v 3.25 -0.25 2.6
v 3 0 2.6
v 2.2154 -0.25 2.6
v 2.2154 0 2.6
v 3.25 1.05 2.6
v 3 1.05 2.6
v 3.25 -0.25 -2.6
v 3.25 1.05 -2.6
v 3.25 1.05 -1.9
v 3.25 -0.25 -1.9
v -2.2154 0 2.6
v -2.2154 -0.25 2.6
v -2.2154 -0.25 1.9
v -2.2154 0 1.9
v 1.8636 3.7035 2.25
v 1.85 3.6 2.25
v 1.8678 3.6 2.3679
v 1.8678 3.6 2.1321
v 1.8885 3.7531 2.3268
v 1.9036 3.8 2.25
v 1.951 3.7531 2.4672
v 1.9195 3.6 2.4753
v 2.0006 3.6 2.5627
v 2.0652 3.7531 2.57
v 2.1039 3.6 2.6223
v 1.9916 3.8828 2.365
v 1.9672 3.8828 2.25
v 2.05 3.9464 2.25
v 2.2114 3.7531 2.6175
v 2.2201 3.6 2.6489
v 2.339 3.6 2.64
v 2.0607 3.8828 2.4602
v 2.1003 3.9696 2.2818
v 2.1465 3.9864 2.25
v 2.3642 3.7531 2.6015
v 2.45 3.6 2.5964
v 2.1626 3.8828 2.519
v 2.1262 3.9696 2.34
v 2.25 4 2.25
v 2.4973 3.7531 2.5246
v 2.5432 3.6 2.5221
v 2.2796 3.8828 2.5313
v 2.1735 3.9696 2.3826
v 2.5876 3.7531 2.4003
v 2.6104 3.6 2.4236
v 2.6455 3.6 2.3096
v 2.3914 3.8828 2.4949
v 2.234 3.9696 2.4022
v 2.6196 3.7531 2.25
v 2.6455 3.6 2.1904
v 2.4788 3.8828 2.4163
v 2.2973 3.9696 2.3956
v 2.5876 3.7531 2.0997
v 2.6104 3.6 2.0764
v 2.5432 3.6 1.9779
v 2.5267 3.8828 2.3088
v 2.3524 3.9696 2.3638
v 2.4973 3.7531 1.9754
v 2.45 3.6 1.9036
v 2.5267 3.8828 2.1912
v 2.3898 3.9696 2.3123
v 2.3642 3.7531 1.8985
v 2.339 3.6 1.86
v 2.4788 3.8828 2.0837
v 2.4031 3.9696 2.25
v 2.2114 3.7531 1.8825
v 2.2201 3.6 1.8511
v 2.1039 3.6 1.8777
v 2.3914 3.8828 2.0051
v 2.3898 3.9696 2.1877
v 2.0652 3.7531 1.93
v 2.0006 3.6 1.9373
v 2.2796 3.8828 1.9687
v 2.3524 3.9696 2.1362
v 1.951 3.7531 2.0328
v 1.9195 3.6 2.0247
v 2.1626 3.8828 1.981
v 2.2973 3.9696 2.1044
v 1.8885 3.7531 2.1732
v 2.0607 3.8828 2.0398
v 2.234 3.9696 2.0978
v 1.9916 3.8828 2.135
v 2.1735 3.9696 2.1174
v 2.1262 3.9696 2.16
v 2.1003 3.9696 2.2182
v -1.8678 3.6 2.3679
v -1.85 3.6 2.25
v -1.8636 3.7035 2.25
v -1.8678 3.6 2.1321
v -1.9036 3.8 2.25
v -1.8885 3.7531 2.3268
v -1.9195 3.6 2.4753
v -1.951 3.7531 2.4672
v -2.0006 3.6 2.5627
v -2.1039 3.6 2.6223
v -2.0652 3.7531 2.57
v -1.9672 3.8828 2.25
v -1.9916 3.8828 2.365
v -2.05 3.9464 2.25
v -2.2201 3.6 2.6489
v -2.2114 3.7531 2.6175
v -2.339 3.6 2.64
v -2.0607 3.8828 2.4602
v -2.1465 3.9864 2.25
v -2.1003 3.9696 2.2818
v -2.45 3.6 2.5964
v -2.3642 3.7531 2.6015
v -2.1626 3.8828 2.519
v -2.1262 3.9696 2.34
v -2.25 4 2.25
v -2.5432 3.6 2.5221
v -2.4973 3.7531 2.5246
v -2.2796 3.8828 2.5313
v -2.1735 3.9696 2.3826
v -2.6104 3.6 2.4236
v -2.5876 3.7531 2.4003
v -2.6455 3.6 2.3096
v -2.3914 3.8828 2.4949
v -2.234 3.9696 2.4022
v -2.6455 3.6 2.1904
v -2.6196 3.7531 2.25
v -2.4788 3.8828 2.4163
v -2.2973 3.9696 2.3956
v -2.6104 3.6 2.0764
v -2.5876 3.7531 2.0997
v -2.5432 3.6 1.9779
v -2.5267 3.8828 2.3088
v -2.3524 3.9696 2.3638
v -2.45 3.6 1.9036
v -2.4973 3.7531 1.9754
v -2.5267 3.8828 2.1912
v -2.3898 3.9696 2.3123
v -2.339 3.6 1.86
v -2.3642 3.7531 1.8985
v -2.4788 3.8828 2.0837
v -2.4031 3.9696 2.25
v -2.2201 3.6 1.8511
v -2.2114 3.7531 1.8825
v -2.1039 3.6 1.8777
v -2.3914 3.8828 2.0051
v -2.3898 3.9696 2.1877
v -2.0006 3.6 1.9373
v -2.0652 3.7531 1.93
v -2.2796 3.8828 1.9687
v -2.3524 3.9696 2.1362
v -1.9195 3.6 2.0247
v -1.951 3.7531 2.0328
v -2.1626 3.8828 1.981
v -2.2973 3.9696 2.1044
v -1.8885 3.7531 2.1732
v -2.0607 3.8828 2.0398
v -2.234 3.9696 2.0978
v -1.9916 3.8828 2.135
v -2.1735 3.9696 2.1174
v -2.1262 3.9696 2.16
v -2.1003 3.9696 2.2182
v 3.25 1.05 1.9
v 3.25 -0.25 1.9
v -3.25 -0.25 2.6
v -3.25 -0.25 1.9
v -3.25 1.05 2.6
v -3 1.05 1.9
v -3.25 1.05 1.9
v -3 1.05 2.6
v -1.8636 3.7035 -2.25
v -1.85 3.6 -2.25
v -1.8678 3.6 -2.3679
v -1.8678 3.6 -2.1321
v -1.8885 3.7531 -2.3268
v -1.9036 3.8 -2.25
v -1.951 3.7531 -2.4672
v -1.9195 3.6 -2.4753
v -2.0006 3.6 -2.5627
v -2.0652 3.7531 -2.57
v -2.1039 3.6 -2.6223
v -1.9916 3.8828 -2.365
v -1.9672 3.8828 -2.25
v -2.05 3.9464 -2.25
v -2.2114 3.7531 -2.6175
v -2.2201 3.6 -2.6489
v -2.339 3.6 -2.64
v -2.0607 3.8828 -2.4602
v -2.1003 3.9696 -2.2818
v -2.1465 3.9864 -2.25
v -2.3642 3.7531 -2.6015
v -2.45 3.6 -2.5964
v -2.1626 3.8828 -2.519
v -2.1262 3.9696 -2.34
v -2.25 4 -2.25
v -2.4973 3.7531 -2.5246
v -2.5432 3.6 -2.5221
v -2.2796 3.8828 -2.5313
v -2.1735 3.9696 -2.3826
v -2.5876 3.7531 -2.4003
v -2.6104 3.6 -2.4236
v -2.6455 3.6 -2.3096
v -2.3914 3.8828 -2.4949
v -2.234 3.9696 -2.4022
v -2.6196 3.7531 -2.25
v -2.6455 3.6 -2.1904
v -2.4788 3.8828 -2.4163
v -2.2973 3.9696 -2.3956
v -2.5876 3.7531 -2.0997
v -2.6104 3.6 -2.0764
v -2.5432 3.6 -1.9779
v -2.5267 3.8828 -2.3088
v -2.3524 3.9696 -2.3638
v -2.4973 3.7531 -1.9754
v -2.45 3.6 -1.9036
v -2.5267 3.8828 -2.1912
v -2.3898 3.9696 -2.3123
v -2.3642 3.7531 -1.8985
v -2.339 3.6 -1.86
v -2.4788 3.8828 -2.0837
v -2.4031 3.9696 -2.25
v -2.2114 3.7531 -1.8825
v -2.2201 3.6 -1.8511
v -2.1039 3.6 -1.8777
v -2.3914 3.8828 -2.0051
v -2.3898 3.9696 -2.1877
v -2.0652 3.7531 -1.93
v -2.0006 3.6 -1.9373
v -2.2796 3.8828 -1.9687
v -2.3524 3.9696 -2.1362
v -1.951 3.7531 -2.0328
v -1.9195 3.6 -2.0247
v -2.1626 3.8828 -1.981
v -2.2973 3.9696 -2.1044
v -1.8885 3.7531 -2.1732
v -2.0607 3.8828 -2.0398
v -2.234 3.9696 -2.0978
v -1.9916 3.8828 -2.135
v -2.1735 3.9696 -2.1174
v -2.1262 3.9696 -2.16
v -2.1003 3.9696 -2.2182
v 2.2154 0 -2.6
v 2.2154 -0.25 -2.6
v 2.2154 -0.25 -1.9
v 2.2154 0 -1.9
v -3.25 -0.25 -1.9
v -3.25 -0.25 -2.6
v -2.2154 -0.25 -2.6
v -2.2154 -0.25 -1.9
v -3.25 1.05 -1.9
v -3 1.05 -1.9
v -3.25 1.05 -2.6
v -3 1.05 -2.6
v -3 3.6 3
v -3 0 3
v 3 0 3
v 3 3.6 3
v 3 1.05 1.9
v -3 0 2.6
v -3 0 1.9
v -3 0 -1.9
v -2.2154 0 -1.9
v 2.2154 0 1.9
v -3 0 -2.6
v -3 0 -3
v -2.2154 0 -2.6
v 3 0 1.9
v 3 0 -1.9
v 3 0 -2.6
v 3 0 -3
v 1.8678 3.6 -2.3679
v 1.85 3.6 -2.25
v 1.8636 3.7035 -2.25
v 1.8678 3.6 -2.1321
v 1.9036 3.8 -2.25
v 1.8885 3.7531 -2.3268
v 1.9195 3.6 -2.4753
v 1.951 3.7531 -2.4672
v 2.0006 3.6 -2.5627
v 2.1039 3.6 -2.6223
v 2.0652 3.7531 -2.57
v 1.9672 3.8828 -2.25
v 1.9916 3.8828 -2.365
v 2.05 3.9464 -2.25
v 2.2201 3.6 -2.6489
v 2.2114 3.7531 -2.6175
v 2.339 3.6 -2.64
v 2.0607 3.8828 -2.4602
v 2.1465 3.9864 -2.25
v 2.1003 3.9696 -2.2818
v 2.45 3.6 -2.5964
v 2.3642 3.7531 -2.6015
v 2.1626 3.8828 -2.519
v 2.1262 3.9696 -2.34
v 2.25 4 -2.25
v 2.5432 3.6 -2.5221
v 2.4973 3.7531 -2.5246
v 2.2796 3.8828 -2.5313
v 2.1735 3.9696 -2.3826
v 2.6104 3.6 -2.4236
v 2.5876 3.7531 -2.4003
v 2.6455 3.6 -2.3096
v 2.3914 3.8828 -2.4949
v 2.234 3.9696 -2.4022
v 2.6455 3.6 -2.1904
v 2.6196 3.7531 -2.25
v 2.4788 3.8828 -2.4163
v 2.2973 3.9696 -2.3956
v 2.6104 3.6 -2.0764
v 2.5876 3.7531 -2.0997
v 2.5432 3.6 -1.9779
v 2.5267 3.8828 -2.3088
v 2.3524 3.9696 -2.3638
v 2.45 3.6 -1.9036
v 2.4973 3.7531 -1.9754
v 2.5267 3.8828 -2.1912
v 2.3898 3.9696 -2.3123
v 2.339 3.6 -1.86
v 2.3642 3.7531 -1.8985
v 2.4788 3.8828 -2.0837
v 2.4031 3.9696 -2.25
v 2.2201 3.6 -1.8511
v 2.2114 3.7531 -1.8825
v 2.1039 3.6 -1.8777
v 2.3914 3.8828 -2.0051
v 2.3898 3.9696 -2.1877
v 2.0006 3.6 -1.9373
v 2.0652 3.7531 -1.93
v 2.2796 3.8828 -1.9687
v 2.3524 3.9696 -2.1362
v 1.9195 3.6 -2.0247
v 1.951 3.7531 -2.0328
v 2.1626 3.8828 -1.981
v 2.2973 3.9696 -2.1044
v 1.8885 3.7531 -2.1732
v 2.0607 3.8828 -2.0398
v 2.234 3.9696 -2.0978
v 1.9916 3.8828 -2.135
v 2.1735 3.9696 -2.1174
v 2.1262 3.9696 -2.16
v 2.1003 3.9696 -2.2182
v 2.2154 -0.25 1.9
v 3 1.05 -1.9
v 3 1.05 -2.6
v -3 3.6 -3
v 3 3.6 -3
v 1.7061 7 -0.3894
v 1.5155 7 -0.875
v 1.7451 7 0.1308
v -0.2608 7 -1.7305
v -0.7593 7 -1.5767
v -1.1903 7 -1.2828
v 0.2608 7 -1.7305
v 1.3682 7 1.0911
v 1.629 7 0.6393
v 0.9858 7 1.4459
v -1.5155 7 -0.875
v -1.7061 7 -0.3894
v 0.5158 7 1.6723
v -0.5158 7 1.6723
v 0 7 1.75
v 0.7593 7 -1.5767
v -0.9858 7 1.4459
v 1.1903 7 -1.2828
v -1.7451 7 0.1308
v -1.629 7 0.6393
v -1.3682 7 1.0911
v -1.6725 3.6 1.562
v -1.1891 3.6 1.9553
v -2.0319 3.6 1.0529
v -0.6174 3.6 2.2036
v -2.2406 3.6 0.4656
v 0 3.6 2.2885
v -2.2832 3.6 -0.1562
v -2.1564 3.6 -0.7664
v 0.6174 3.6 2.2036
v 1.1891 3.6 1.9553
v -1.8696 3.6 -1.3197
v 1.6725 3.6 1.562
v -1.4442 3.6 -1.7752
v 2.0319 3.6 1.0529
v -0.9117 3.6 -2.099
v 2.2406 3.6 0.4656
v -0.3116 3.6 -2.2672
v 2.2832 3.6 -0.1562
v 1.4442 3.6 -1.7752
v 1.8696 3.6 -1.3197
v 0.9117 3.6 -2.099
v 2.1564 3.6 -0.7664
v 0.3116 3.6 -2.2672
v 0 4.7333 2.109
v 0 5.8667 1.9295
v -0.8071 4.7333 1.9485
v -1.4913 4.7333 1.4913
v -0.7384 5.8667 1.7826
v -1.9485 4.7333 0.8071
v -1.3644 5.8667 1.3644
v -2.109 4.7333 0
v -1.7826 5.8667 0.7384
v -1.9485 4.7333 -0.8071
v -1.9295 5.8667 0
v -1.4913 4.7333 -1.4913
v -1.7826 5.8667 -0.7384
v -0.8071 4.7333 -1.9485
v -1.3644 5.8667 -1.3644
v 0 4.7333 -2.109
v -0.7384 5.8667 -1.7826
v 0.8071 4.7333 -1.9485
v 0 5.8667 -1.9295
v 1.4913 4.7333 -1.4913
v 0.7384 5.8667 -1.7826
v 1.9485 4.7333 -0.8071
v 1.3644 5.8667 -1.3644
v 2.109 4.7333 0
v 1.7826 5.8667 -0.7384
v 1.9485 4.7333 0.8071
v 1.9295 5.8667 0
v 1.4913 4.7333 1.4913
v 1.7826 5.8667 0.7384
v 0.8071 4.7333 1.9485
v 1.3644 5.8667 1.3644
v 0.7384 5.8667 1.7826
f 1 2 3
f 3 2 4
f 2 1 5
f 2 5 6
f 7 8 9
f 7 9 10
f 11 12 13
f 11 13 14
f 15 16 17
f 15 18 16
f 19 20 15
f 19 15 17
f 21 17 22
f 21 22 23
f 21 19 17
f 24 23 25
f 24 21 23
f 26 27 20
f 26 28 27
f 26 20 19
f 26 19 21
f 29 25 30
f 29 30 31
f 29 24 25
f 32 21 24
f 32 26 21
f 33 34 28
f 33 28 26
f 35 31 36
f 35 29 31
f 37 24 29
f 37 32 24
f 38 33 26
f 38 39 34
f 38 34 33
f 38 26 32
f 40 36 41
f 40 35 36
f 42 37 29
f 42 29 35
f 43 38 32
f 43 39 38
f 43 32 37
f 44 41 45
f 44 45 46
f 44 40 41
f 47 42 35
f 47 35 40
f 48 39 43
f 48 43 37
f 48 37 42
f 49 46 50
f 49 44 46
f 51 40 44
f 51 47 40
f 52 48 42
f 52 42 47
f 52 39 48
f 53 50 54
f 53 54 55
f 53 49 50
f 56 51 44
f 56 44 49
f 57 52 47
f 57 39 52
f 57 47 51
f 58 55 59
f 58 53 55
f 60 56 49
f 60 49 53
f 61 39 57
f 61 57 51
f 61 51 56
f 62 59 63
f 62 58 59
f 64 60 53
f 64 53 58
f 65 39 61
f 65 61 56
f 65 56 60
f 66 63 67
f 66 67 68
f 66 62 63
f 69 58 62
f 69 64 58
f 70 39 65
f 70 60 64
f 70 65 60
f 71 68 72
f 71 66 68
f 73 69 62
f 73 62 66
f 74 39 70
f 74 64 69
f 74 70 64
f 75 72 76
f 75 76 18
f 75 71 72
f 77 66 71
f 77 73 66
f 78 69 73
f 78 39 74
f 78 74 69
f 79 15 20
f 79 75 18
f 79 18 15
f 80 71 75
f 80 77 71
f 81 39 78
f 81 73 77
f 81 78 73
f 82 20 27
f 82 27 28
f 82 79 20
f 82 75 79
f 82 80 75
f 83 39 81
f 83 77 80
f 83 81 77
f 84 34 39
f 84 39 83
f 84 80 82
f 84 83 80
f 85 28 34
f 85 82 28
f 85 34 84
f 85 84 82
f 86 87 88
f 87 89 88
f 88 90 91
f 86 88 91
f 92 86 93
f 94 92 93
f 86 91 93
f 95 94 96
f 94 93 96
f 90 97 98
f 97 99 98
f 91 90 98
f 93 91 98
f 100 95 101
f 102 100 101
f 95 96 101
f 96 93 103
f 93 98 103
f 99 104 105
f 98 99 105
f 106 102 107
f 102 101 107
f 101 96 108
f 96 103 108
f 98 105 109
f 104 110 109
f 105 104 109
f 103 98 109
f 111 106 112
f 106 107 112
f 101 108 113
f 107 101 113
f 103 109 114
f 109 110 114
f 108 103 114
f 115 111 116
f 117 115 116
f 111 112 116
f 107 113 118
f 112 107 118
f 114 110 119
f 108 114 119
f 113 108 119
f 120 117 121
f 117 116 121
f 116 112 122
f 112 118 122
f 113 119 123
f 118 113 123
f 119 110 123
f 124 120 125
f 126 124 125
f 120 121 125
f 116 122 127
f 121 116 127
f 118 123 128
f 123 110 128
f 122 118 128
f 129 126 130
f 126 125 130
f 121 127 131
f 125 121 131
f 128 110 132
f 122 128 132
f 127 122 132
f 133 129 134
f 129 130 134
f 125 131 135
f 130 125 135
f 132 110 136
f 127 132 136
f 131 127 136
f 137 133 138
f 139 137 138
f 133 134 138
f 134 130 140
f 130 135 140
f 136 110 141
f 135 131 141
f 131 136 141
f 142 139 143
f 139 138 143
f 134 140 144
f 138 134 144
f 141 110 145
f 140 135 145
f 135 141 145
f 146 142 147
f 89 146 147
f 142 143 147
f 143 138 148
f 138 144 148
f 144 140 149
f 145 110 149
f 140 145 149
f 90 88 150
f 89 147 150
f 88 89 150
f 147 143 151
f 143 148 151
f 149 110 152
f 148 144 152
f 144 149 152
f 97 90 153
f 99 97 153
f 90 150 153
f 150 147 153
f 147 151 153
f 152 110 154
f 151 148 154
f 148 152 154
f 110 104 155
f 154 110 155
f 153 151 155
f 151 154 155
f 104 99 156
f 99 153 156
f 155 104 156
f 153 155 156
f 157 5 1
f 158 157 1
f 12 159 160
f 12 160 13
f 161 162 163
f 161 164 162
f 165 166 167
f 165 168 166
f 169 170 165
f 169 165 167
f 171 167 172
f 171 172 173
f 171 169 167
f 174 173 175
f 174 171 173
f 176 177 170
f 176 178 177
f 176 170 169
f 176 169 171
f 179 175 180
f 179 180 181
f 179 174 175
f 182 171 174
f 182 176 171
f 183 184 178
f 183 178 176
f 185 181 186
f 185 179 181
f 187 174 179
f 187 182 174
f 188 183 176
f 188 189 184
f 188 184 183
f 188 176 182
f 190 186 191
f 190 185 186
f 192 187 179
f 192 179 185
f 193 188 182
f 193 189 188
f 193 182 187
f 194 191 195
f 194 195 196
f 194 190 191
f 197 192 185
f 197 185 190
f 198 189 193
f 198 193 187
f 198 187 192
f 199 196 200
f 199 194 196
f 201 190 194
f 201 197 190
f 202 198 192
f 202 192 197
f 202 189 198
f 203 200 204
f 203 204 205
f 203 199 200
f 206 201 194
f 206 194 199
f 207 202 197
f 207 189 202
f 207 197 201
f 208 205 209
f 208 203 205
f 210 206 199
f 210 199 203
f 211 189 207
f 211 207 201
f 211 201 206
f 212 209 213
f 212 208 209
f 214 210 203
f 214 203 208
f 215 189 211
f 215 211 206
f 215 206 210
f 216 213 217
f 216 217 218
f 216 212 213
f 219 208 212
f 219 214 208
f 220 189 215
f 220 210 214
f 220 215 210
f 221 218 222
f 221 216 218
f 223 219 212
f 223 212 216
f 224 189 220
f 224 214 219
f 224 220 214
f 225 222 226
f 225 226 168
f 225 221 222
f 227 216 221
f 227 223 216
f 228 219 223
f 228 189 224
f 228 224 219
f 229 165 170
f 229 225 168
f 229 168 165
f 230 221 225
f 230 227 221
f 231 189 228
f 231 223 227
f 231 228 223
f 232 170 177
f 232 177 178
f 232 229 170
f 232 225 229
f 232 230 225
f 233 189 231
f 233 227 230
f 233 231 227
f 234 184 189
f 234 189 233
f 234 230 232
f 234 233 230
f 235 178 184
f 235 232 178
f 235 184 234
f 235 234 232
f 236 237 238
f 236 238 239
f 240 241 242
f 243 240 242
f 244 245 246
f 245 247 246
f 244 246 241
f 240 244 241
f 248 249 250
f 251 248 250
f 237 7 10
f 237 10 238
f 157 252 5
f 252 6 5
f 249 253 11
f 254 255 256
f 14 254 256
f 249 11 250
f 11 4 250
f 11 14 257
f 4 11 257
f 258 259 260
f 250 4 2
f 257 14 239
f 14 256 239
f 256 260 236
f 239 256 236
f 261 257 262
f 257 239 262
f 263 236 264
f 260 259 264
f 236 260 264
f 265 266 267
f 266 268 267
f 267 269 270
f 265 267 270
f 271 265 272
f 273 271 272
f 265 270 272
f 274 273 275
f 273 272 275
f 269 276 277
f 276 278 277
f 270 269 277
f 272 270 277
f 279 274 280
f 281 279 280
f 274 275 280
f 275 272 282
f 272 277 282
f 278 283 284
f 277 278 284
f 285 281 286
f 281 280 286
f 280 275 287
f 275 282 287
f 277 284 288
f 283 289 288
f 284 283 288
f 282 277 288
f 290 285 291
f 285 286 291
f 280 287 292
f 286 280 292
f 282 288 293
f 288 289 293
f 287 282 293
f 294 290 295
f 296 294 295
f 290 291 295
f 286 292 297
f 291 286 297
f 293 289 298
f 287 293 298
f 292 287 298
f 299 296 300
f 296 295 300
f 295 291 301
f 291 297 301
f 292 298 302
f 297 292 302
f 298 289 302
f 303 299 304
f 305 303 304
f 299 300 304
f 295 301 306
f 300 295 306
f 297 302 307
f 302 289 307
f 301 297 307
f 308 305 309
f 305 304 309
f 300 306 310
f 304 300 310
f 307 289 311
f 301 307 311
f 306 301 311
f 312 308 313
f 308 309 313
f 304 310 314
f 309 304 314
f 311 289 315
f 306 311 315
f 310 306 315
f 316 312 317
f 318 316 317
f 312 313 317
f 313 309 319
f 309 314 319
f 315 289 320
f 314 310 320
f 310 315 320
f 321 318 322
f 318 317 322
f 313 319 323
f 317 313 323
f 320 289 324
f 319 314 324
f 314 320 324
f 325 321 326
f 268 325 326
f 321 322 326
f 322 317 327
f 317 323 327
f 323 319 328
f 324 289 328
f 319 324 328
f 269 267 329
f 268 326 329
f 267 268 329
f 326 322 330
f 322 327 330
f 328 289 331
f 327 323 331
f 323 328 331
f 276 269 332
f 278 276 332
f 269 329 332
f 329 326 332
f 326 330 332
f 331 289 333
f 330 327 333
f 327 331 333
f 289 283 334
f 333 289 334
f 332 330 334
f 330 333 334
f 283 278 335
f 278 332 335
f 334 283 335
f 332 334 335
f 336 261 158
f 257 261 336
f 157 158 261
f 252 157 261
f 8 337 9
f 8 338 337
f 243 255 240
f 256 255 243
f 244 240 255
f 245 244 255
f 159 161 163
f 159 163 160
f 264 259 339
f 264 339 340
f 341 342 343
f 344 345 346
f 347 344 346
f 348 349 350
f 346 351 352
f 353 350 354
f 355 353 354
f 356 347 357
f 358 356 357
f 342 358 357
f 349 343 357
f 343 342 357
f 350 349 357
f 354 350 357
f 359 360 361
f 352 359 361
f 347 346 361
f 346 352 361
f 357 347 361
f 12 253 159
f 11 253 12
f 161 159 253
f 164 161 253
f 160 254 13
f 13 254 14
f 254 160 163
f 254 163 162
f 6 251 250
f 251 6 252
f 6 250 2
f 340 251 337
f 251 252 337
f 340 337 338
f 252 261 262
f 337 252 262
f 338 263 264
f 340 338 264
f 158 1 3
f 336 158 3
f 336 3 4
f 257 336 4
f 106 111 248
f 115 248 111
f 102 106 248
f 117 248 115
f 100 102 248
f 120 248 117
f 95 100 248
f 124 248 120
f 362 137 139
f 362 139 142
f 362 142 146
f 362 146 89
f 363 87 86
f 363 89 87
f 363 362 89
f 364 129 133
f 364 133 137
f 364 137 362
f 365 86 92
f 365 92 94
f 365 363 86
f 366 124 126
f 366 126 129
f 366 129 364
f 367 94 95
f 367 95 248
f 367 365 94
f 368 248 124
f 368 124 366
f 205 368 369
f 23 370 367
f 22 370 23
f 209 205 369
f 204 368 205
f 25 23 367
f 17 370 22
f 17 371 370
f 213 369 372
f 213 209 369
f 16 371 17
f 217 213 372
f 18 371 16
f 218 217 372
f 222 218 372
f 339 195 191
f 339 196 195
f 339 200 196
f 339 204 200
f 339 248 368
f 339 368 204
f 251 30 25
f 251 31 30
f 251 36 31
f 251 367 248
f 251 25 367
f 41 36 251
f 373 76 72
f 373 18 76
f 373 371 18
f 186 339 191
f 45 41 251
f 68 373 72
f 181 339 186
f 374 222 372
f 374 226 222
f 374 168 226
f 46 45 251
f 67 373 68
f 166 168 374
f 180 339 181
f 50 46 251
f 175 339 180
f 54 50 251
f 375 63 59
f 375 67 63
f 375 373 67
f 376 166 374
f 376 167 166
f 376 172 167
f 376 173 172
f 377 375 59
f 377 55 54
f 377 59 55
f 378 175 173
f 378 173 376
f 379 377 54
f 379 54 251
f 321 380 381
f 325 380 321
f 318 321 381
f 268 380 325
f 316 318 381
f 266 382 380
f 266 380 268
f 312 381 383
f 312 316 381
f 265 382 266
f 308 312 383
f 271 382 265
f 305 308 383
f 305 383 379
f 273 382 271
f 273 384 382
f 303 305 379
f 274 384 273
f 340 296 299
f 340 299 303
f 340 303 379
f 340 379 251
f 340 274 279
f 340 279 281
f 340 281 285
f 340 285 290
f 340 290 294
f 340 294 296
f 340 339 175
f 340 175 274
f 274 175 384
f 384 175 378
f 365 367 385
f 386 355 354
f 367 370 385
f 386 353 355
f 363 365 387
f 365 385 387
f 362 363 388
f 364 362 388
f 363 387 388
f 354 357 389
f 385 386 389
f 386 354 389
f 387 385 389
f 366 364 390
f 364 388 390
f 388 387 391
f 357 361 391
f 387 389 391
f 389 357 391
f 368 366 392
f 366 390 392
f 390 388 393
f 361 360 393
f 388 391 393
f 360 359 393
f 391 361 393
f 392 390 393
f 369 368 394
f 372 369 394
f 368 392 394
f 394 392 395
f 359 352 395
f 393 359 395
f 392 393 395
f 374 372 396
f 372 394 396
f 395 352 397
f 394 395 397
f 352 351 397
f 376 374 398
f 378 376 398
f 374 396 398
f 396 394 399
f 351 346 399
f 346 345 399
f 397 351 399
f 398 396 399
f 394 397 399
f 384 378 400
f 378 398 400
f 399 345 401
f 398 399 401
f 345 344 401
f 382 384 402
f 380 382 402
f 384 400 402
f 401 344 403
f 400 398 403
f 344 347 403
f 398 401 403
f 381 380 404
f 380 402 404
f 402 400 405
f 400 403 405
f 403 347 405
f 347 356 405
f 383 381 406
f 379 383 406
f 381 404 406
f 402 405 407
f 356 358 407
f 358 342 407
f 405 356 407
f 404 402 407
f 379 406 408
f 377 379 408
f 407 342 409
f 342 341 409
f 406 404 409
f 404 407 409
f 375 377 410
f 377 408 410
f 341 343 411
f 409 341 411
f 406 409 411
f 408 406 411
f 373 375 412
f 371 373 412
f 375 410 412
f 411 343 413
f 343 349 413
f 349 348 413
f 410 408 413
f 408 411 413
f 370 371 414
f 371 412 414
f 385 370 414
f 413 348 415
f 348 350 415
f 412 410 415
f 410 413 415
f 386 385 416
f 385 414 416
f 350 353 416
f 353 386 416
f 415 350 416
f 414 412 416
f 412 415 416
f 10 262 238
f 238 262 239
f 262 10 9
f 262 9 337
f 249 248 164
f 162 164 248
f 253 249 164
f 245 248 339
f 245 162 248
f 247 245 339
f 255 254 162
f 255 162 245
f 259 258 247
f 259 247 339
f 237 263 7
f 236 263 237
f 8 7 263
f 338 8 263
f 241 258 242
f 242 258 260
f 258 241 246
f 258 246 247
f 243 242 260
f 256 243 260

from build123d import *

# Parameters (mm, degrees)
SKETCH1_W            = 6
SKETCH1_H            = 6
EXTRUDE1_DEPTH       = 3.6
EXTRUDE2_DEPTH       = 0.35
MIRROR4_COPY_1_DEPTH = 0.35


with BuildPart() as part:
    # Sketch1 → Extrude1 (new body)
    with BuildSketch(Plane(origin=(0, 0, 0), x_dir=(1, 0, 0), z_dir=(0, 1, 0))):
        Rectangle(SKETCH1_W, SKETCH1_H)
    extrude(amount=EXTRUDE1_DEPTH)

    # Sketch2 → Revolve1 (revolve)
    with BuildSketch(Plane.XY.offset(2.25)):
        with BuildLine():
            Line((-2.25, 3.6), (-1.85, 3.6))
            ThreePointArc((-1.85, 3.6), (-1.967157288, 3.882842712), (-2.25, 4))
            Line((-2.25, 4), (-2.25, 3.6))
        make_face()
    revolve1 = revolve(axis=Axis((-2.25, 4.707394025, 2.25), (0, -1, 0)))

    # Mirror1: Revolve1 across plane
    add(revolve1.mirror(Plane.XY))

    # Mirror2: Revolve1 across plane
    add(revolve1.mirror(Plane(origin=(0, 0, 0), x_dir=(0, 0, 1), z_dir=(1, 0, 0))))

    # Mirror2 copy 1 sketch → Mirror2 copy 1 (revolve)
    with BuildSketch(Plane(origin=(0, 0, -2.25), x_dir=(-1, 0, 0), z_dir=(0, 0, -1))):
        with BuildLine():
            Line((-2.25, 3.6), (-1.85, 3.6))
            ThreePointArc((-1.85, 3.6), (-1.967157288, 3.882842712), (-2.25, 4))
            Line((-2.25, 4), (-2.25, 3.6))
        make_face()
    revolve(axis=Axis((2.25, 4.707394025, -2.25), (0, -1, 0)))

    # Sketch3 → Revolve2 (revolve)
    with BuildSketch(Plane.XY, mode=Mode.PRIVATE) as revolve2_sk:
        Polygon((-2.288507097, 3.6), (-1.75, 7), (0, 7), (0, 3.6), align=None)
    revolve(revolve2_sk.sketch.rotate(Axis((0, 7, 0), (0, -1, 0)), 270), axis=Axis((0, 7, 0), (0, -1, 0)))  # turned: the seam where the file's is

    # Sketch5 → Extrude2 (add, symmetric)
    with BuildSketch(Plane.XY.offset(2.25)):
        Polygon((-3, 1.05), (-3.25, 1.05), (-3.25, -0.25), (-2.215388365, -0.25), (-2.215388365, 0), (-3, 0), align=None)
    extrude2 = extrude(amount=EXTRUDE2_DEPTH, both=True)

    # Mirror3: Extrude2 across plane
    add(extrude2.mirror(Plane.XY))

    # Mirror4: Extrude2 across plane
    add(extrude2.mirror(Plane(origin=(0, 0, 0), x_dir=(0, 0, 1), z_dir=(1, 0, 0))))

    # Mirror4 copy 1 sketch → Mirror4 copy 1 (add, symmetric)
    with BuildSketch(Plane(origin=(0, 0, -2.25), x_dir=(-1, 0, 0), z_dir=(0, 0, -1))):
        Polygon((-3, 1.05), (-3.25, 1.05), (-3.25, -0.25), (-2.215388365, -0.25), (-2.215388365, 0), (-3, 0), align=None)
    extrude(amount=MIRROR4_COPY_1_DEPTH, both=True)


solid = part.part
